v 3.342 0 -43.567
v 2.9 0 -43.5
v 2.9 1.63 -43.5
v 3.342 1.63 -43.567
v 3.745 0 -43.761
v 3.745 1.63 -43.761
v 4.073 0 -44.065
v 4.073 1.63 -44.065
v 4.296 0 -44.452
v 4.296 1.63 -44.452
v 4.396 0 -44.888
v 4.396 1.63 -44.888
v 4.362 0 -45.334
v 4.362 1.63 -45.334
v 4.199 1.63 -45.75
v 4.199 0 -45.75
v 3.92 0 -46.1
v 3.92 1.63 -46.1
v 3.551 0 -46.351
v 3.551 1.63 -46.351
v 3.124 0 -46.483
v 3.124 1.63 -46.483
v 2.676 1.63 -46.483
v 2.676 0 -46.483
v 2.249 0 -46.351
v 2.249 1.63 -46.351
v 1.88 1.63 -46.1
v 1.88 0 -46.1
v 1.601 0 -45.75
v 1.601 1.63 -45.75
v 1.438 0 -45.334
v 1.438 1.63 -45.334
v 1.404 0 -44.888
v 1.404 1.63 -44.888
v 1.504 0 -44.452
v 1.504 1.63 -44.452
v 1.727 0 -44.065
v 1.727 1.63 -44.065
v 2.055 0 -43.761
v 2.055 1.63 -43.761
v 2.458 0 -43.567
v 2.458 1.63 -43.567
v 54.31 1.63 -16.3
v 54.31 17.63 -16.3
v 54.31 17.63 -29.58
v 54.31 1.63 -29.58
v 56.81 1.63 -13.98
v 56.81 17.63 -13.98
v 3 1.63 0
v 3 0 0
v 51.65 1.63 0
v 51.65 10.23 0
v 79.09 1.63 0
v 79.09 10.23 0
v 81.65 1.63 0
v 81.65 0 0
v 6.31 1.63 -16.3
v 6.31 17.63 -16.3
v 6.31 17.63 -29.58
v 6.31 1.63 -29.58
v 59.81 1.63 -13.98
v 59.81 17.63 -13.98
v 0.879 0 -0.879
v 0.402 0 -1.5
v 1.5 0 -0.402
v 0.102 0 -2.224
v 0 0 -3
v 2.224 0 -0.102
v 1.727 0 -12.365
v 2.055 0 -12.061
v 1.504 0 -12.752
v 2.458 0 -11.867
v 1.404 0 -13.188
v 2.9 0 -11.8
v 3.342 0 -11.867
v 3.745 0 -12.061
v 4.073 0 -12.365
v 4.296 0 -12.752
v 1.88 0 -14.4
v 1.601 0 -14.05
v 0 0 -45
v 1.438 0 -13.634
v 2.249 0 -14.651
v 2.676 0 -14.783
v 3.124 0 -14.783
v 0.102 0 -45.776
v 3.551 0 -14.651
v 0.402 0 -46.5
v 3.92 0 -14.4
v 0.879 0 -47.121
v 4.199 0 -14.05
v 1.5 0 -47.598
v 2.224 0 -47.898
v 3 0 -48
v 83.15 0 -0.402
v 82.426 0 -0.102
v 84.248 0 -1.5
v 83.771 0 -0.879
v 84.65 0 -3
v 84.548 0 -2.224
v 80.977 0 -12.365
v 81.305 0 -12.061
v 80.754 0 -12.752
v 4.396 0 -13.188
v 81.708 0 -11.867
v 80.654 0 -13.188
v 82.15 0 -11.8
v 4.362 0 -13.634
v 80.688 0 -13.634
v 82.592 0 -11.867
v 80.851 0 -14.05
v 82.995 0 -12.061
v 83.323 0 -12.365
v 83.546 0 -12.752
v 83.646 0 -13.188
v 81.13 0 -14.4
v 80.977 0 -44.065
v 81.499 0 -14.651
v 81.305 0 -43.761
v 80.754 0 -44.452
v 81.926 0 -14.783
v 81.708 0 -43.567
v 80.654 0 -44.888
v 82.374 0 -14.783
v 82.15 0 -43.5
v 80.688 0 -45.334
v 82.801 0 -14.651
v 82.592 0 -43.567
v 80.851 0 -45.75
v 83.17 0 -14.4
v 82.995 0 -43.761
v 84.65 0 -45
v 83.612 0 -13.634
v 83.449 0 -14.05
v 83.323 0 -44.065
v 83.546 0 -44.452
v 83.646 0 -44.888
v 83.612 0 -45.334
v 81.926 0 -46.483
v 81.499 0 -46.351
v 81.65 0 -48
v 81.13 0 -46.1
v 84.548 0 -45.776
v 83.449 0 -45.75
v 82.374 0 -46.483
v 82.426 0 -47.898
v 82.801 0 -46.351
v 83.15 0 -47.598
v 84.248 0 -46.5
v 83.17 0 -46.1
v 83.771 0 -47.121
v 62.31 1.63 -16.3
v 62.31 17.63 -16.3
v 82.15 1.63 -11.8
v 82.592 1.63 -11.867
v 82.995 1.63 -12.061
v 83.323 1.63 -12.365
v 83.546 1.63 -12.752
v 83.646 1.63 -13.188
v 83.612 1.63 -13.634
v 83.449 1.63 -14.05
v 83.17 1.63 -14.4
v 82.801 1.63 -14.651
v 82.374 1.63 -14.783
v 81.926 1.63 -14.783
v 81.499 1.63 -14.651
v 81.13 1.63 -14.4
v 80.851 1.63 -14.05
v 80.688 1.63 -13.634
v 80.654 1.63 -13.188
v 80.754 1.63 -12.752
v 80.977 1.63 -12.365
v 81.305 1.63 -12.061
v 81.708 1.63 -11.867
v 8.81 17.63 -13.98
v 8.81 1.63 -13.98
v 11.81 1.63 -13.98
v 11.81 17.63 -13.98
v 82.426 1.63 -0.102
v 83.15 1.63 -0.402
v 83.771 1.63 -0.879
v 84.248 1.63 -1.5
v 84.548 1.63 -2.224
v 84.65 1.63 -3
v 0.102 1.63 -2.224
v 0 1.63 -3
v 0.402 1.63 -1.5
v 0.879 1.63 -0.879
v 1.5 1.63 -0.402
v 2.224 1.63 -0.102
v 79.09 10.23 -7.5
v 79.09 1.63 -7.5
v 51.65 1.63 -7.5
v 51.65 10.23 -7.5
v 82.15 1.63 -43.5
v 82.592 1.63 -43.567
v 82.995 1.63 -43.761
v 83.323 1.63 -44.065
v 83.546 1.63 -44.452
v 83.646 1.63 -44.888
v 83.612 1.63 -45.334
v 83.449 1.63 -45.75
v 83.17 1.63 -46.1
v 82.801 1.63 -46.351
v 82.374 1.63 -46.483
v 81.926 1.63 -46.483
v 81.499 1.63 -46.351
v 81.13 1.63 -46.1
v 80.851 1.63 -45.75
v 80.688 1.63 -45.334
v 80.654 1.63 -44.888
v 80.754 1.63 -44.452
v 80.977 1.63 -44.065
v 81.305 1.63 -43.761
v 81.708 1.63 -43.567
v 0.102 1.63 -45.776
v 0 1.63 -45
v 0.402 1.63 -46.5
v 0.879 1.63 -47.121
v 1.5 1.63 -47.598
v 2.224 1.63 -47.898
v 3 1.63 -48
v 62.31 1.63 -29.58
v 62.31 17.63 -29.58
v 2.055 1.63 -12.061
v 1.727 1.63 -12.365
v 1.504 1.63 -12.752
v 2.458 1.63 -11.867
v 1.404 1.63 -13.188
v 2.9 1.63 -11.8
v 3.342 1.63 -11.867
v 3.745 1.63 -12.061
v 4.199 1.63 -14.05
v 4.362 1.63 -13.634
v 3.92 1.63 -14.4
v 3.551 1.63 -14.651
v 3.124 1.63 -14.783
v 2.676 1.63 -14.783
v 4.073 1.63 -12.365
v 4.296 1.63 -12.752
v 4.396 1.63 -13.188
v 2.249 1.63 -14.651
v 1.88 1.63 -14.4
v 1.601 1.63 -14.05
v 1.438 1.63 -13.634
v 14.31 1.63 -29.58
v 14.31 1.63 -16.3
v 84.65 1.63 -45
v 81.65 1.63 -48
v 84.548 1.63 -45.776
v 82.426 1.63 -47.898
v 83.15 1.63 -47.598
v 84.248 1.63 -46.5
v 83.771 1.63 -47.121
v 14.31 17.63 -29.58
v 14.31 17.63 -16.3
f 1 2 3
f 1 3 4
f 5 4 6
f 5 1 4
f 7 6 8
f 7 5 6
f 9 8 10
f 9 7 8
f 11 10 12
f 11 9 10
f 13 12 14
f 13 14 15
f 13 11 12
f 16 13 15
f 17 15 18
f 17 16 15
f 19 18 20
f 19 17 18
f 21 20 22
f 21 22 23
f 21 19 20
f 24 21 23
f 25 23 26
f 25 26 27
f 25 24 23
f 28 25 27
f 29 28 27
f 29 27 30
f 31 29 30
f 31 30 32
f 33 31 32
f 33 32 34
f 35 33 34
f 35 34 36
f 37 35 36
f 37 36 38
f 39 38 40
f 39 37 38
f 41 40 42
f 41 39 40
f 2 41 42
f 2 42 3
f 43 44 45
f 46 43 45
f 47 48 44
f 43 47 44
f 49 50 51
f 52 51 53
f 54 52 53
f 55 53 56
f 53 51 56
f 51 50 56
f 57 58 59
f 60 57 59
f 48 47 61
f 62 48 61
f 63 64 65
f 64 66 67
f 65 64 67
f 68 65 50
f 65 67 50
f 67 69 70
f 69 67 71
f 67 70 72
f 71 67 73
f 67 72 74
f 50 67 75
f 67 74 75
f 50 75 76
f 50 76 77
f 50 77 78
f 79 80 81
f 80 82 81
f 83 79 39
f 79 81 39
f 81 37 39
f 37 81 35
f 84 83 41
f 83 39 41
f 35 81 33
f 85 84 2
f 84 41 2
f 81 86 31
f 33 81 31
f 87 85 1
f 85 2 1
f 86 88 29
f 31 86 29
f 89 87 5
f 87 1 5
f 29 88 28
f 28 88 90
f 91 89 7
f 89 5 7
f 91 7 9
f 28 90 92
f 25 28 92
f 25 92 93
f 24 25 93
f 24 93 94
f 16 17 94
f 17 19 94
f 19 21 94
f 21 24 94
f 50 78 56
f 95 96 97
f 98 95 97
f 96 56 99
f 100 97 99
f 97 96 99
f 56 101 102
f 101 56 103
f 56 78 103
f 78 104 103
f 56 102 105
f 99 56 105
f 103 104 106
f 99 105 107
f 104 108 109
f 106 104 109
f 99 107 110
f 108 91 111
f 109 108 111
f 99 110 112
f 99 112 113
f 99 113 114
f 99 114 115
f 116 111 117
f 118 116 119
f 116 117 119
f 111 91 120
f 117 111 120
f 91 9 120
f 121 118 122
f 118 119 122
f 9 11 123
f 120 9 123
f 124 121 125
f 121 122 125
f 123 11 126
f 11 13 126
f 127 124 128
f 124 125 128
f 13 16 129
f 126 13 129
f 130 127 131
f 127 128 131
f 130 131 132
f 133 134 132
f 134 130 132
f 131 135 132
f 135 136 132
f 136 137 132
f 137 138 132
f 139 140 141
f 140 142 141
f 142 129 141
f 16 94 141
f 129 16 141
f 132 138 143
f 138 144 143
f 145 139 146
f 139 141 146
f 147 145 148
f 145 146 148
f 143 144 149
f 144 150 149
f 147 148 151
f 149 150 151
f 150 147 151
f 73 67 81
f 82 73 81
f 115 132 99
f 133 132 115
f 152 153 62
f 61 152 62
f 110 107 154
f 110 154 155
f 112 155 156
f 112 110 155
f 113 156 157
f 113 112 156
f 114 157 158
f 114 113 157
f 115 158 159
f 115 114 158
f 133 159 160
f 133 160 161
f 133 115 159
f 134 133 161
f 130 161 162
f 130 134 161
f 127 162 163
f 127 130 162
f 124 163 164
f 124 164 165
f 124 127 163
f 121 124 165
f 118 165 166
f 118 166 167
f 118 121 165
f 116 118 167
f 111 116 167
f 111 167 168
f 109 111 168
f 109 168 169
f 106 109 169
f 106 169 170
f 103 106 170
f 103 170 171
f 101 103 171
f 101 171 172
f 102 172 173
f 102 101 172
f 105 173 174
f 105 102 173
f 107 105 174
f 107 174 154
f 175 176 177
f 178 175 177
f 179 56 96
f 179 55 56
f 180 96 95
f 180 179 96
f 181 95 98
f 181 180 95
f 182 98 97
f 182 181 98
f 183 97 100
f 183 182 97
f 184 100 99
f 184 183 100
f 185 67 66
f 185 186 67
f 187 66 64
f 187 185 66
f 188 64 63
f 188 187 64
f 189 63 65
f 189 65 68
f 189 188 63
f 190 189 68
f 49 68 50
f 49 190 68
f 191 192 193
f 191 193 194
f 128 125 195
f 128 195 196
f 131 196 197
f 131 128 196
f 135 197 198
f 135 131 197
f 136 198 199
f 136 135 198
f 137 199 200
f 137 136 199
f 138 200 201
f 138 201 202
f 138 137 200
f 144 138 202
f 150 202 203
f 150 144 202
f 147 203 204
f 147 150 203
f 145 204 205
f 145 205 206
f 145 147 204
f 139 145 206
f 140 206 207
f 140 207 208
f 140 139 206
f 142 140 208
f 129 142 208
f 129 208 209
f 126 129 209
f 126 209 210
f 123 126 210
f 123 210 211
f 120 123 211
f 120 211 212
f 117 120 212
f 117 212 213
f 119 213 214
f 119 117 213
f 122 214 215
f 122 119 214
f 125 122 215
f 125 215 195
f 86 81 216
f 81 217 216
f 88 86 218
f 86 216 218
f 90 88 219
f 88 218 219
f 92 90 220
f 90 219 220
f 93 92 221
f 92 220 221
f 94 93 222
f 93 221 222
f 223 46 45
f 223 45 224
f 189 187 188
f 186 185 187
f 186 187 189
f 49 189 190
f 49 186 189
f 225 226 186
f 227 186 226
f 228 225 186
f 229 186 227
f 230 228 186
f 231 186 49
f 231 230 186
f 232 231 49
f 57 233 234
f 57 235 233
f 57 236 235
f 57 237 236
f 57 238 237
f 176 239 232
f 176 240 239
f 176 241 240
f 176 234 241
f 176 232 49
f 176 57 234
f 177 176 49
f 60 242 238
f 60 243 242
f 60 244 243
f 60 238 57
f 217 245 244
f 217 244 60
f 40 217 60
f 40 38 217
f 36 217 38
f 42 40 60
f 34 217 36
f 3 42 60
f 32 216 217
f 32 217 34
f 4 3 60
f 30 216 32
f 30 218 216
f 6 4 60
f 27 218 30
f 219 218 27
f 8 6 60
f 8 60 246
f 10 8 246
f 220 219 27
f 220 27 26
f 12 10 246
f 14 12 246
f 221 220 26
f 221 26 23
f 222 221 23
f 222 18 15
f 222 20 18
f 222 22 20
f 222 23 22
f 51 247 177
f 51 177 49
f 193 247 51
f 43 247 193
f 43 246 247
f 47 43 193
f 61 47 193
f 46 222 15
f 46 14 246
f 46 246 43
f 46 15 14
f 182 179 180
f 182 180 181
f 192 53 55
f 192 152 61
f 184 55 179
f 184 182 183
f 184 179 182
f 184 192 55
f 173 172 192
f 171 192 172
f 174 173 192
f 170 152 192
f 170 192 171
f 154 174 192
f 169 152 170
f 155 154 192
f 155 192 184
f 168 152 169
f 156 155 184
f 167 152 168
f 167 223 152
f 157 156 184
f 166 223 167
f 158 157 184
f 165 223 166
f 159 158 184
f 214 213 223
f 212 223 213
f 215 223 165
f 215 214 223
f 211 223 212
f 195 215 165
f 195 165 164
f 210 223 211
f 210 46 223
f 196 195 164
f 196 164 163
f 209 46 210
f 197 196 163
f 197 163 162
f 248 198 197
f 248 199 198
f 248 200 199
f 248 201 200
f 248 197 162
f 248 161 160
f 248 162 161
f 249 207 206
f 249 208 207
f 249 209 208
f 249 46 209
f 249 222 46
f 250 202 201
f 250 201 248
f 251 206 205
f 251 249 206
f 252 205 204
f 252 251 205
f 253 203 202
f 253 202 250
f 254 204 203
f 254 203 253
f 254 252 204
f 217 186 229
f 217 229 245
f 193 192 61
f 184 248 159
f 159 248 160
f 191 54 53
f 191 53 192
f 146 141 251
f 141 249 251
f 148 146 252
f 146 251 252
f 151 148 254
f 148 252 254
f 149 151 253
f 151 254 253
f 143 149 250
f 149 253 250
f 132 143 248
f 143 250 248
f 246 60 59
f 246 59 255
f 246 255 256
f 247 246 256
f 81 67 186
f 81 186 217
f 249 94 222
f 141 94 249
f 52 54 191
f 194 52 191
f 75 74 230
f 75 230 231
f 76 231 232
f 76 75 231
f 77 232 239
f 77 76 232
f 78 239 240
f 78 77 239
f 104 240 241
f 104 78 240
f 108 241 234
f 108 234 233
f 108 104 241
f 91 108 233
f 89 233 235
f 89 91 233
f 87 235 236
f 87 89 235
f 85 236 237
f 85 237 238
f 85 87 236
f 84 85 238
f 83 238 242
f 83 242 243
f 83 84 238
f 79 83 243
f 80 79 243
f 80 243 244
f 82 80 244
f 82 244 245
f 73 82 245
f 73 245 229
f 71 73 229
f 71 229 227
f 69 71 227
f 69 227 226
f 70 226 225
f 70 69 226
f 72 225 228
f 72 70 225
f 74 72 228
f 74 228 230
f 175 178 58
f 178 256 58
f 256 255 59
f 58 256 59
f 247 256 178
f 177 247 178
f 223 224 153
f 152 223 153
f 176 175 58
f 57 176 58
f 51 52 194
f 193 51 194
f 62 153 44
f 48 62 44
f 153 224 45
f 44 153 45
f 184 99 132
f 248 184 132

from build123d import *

# Parameters (mm, degrees)
SKETCH_1_W      = 84.65
SKETCH_1_H      = 48
SKETCH_1_R      = 1.5
EXTRUDE_1_DEPTH = 1.63
FILLET_1_R      = 3
SKETCH_4_W      = 7.5
SKETCH_4_H      = 8.6
EXTRUDE_2_DEPTH = 27.44
EXTRUDE_3_DEPTH = 16


with BuildPart() as part:
    # 草图1 → 凸台-拉伸1 (new body)
    with BuildSketch(Plane(origin=(0, 0, 0), x_dir=(1, 0, 0), z_dir=(0, 1, 0))):
        with Locations((42.325, 24)):
            Rectangle(SKETCH_1_W, SKETCH_1_H)
        with Locations(Location((2.9, 45, 0), (0, 0, 270))):
            Circle(SKETCH_1_R, mode=Mode.SUBTRACT)
        with Locations(Location((2.9, 13.3, 0), (0, 0, 270))):
            Circle(SKETCH_1_R, mode=Mode.SUBTRACT)
        with Locations(Location((82.15, 45, 0), (0, 0, 270))):
            Circle(SKETCH_1_R, mode=Mode.SUBTRACT)
        with Locations(Location((82.15, 13.3, 0), (0, 0, 270))):
            Circle(SKETCH_1_R, mode=Mode.SUBTRACT)
    extrude(amount=EXTRUDE_1_DEPTH)

    # 圆角1
    fillet_1_edges = [part.edges().sort_by_distance(p)[0] for p in [
        (0, 0.815, 0),
        (0, 0.815, -48),
        (84.65, 0.815, -48),
        (84.65, 0.815, 0),
    ]]
    fillet(fillet_1_edges, radius=FILLET_1_R)

    # 草图4 → 凸台-拉伸2 (add)
    with BuildSketch(Plane(origin=(51.65, 0, 0), x_dir=(0, 0, -1), z_dir=(1, 0, 0))):
        with Locations((3.75, 5.93)):
            Rectangle(SKETCH_4_W, SKETCH_4_H)
    extrude(amount=EXTRUDE_2_DEPTH)

    # 草图5 → 凸台-拉伸3 (add)
    with BuildSketch(Plane(origin=(0, 1.63, 0), x_dir=(1, 0, 0), z_dir=(0, 1, 0))):
        Polygon((62.31, 29.58), (62.31, 16.3), (59.81, 13.98), (58.31, 13.98), (56.81, 13.98), (54.31, 16.3), (54.31, 29.58), align=None)
        Polygon((10.31, 13.98), (8.81, 13.98), (6.31, 16.3), (6.31, 29.58), (14.31, 29.58), (14.31, 16.3), (11.81, 13.98), align=None)
    extrude(amount=EXTRUDE_3_DEPTH)


solid = part.part
